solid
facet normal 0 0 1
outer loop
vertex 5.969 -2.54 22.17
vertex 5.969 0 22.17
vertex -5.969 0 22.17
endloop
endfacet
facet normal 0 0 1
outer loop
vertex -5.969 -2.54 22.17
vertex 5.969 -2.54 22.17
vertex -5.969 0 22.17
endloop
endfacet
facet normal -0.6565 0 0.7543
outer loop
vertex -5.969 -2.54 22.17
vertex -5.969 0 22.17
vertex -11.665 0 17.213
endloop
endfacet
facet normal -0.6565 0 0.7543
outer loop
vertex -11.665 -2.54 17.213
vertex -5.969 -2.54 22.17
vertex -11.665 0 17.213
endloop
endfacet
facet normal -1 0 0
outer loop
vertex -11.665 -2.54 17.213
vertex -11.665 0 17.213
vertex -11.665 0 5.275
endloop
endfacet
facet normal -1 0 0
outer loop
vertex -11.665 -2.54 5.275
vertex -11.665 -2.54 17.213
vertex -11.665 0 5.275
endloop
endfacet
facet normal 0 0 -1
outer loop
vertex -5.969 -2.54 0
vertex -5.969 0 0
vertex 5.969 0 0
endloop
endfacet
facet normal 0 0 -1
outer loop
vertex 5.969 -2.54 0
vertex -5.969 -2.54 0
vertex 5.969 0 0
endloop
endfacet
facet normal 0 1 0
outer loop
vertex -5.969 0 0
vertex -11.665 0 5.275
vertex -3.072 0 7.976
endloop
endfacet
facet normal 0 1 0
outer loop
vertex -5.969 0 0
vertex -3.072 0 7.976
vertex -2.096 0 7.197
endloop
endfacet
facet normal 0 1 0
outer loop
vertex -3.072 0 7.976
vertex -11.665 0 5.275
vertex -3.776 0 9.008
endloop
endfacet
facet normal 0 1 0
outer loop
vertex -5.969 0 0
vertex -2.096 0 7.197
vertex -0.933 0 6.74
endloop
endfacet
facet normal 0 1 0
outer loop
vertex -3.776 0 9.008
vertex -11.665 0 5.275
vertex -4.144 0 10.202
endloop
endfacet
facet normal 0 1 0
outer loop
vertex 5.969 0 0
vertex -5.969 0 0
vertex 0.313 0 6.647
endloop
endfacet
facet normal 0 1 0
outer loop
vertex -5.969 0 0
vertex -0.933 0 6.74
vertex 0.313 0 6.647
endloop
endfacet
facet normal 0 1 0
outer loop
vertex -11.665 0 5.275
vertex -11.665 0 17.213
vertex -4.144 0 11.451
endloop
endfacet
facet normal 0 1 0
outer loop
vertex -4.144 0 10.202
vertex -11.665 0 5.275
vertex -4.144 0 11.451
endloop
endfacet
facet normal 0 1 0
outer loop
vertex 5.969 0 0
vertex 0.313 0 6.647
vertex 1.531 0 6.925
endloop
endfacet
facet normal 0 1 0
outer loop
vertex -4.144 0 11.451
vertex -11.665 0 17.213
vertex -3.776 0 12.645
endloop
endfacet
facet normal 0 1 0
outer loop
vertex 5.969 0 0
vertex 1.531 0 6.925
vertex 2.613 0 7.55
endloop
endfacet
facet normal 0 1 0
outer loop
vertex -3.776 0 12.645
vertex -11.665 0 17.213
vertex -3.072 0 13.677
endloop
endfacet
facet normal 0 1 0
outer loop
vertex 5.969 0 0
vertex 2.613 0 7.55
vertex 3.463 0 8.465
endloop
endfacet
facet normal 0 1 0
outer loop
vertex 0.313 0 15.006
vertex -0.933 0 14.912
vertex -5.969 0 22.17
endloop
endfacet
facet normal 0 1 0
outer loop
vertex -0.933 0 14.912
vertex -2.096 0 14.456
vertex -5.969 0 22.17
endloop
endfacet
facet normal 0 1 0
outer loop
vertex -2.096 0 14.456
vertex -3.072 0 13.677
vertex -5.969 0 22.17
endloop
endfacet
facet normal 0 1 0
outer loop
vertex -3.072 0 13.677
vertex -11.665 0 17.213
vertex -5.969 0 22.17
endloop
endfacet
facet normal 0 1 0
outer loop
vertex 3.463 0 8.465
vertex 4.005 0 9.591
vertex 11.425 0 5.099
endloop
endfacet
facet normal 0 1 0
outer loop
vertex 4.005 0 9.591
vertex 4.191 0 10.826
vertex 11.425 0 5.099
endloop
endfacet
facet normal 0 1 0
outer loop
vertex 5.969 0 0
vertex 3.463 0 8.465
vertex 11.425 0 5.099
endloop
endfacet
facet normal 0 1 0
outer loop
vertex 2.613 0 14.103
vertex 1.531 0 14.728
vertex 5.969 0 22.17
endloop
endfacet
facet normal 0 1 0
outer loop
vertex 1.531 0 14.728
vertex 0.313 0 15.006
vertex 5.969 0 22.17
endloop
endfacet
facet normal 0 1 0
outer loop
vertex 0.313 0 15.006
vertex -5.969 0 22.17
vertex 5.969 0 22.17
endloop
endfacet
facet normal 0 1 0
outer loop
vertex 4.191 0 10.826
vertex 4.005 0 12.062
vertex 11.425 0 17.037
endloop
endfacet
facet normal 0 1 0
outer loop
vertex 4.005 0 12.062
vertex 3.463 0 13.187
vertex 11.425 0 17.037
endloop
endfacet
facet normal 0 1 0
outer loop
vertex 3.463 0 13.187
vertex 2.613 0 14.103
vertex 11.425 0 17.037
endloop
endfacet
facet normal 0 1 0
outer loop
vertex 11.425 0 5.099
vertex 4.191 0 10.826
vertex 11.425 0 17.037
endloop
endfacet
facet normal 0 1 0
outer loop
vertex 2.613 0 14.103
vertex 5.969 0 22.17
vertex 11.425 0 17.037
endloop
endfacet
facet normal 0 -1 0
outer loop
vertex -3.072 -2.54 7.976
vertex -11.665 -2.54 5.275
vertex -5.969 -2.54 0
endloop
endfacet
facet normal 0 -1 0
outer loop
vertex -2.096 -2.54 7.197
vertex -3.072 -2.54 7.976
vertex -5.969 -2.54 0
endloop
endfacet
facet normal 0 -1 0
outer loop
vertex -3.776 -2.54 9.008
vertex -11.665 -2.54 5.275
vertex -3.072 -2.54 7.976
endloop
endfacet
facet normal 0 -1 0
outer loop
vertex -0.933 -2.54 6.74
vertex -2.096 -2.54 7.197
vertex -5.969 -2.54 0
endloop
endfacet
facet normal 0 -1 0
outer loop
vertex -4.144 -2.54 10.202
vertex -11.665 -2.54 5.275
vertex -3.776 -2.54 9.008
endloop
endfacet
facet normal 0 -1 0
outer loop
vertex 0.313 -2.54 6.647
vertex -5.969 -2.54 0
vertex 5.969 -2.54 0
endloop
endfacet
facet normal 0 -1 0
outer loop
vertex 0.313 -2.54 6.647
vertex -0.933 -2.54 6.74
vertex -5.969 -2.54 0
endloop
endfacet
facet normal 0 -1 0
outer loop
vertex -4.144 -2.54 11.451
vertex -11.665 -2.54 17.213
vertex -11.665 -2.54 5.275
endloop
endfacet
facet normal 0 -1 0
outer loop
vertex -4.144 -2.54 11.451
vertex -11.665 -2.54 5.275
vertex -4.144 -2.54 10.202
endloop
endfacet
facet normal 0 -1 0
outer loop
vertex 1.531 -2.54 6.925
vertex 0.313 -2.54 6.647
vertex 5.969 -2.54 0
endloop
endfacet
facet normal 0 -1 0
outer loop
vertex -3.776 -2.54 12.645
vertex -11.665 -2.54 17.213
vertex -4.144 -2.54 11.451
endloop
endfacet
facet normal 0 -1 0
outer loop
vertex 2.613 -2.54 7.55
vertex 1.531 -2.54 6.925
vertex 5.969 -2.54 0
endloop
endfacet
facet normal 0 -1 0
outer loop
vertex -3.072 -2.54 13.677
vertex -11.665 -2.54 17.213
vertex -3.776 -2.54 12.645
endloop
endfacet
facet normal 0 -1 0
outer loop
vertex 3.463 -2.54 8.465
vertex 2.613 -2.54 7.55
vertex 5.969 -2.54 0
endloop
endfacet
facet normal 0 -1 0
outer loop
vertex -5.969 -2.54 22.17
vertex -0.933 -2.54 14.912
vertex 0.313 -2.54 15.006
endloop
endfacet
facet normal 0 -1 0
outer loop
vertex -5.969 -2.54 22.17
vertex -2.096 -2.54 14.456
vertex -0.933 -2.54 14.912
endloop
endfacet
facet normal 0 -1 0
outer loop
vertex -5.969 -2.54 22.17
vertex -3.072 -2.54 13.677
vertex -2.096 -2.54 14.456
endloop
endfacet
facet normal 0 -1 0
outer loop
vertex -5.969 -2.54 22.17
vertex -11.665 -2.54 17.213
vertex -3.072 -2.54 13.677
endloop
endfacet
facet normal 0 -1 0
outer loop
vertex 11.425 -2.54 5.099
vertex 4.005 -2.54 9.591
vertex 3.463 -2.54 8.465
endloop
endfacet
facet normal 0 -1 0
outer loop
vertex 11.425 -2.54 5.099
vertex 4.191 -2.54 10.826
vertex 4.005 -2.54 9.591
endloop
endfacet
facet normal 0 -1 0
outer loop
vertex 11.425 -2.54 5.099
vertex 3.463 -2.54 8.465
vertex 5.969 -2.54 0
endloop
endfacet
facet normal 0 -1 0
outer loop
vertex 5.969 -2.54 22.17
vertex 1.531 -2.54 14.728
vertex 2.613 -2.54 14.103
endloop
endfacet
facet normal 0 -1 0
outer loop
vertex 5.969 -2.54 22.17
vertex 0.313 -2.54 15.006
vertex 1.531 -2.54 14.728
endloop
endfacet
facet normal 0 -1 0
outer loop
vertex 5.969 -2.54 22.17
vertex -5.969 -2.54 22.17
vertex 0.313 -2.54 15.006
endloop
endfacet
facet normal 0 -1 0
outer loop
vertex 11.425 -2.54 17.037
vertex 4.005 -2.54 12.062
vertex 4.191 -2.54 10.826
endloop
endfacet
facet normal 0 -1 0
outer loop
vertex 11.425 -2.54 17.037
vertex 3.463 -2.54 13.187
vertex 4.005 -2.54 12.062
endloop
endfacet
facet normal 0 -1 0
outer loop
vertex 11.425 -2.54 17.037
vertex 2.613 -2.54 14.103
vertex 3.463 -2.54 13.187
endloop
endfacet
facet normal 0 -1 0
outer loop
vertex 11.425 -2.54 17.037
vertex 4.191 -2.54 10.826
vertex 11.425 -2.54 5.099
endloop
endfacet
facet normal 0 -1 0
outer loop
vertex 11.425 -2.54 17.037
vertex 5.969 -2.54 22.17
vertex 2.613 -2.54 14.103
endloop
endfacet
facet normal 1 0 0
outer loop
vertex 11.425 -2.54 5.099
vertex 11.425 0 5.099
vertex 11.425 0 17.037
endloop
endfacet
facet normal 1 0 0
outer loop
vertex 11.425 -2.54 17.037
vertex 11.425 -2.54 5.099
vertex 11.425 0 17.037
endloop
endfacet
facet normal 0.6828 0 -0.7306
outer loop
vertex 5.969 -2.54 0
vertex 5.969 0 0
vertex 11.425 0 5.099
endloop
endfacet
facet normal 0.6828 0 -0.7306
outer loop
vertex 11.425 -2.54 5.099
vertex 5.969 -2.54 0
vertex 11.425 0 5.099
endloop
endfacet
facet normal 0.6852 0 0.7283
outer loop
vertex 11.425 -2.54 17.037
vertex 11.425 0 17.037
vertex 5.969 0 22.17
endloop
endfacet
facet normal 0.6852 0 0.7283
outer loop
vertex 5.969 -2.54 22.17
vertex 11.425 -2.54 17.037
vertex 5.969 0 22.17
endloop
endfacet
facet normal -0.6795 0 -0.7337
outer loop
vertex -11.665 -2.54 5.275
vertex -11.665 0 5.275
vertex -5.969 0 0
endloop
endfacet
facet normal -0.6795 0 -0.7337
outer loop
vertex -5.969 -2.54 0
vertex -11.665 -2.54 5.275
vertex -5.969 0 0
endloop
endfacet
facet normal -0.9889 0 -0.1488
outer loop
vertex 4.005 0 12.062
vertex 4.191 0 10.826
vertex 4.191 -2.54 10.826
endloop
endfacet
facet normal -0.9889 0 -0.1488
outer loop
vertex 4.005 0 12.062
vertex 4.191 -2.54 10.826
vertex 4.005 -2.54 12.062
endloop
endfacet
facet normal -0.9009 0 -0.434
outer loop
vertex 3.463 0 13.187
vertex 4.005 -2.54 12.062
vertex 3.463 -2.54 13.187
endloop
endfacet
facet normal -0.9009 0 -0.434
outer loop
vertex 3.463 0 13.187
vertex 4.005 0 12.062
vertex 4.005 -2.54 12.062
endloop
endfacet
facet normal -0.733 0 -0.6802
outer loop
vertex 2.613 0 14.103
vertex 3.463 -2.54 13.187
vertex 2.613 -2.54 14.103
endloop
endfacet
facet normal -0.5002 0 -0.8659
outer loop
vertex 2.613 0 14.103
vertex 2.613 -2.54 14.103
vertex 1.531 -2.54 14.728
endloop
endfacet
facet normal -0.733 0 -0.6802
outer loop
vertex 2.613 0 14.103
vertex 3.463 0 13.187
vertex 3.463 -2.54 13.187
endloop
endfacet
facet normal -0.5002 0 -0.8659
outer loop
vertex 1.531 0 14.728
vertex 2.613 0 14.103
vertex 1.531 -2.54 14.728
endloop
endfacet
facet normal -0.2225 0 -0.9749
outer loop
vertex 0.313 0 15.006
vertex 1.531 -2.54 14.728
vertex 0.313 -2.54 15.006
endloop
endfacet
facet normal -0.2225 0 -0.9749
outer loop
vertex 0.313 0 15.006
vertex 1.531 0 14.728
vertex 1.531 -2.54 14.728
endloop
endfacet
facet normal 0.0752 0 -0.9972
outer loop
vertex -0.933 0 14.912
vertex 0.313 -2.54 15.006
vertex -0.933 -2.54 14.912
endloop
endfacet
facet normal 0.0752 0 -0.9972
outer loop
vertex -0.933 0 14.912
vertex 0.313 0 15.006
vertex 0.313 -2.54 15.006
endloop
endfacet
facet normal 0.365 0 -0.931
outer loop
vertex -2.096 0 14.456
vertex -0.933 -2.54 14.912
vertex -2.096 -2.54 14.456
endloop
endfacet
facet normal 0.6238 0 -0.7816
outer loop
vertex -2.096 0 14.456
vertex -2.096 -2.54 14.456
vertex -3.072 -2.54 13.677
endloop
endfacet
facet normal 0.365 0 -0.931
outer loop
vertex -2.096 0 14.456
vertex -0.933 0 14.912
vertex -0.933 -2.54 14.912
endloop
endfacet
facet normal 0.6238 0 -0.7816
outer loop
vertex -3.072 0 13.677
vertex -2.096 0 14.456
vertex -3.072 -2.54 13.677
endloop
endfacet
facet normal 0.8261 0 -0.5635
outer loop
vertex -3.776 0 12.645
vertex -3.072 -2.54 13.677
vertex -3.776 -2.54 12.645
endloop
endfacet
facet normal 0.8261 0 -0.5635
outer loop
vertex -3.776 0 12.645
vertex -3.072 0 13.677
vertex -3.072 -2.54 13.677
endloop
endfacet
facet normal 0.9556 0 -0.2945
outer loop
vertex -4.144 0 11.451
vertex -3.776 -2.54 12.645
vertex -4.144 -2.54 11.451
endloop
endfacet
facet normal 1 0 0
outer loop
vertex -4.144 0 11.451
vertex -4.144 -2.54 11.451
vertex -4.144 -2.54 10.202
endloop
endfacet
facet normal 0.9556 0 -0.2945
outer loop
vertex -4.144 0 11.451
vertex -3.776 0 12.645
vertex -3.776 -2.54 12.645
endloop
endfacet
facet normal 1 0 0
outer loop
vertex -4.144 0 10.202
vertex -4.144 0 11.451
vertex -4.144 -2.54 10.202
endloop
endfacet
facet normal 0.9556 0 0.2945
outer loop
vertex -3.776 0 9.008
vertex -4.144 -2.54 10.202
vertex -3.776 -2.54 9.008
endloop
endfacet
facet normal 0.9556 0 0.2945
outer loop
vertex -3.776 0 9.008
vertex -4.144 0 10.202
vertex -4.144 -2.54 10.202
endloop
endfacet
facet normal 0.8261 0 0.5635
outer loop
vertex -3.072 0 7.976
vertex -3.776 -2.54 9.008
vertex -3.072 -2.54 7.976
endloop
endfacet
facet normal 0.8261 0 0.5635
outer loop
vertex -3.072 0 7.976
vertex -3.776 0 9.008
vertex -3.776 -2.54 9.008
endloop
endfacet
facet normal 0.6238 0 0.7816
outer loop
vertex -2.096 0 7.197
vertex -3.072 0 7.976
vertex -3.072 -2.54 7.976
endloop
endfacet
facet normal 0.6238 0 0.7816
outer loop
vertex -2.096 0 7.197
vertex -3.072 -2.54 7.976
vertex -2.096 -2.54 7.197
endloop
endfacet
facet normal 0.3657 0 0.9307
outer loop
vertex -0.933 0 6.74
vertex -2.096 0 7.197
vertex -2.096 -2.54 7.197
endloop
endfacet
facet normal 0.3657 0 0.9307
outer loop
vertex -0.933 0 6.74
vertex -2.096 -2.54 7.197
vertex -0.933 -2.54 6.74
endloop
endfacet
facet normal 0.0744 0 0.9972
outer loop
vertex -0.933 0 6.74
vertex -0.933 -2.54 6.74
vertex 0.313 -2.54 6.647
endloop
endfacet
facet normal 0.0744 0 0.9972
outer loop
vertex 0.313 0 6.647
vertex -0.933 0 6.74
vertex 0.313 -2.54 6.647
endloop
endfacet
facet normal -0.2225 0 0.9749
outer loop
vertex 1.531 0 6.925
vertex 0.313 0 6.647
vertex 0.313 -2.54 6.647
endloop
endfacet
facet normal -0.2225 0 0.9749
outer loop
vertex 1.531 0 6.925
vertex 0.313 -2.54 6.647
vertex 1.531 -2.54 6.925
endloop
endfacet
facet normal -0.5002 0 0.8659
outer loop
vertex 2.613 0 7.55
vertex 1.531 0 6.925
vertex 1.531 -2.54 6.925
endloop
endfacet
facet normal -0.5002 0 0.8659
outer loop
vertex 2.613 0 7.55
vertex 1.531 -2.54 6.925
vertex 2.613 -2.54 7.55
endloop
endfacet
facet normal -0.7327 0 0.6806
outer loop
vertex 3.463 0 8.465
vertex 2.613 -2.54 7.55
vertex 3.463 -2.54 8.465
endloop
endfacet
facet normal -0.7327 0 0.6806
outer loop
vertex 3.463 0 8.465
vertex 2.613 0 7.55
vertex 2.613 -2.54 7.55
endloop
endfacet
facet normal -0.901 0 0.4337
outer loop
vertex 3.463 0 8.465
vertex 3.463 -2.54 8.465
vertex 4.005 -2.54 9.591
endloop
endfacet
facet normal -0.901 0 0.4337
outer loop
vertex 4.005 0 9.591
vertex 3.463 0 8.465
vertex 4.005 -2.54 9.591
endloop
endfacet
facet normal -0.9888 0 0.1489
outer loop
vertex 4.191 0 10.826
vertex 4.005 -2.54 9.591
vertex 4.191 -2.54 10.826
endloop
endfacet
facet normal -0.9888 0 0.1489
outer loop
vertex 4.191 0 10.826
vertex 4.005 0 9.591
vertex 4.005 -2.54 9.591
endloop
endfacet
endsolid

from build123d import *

# Parameters (mm, degrees)
F0_R     = 4.191
F1_DEPTH = 2.54


with BuildPart() as f1:
    # F0 (on Front) → F1 (new body)
    with BuildSketch(Plane.XZ):
        Polygon((-11.664975, 17.213106), (-11.664975, 11.244106), (-11.664975, 5.275106), (-5.969, 0), (0, 0), (5.969, 0), (11.424948, 5.0987), (11.424948, 11.0677), (11.424948, 17.0367), (5.969, 22.170171), (0, 22.170171), (-5.969, 22.170171), align=None)
        with Locations((0, 10.826342)):
            Circle(F0_R, mode=Mode.SUBTRACT)
    extrude(amount=F1_DEPTH)


solid = f1.part
